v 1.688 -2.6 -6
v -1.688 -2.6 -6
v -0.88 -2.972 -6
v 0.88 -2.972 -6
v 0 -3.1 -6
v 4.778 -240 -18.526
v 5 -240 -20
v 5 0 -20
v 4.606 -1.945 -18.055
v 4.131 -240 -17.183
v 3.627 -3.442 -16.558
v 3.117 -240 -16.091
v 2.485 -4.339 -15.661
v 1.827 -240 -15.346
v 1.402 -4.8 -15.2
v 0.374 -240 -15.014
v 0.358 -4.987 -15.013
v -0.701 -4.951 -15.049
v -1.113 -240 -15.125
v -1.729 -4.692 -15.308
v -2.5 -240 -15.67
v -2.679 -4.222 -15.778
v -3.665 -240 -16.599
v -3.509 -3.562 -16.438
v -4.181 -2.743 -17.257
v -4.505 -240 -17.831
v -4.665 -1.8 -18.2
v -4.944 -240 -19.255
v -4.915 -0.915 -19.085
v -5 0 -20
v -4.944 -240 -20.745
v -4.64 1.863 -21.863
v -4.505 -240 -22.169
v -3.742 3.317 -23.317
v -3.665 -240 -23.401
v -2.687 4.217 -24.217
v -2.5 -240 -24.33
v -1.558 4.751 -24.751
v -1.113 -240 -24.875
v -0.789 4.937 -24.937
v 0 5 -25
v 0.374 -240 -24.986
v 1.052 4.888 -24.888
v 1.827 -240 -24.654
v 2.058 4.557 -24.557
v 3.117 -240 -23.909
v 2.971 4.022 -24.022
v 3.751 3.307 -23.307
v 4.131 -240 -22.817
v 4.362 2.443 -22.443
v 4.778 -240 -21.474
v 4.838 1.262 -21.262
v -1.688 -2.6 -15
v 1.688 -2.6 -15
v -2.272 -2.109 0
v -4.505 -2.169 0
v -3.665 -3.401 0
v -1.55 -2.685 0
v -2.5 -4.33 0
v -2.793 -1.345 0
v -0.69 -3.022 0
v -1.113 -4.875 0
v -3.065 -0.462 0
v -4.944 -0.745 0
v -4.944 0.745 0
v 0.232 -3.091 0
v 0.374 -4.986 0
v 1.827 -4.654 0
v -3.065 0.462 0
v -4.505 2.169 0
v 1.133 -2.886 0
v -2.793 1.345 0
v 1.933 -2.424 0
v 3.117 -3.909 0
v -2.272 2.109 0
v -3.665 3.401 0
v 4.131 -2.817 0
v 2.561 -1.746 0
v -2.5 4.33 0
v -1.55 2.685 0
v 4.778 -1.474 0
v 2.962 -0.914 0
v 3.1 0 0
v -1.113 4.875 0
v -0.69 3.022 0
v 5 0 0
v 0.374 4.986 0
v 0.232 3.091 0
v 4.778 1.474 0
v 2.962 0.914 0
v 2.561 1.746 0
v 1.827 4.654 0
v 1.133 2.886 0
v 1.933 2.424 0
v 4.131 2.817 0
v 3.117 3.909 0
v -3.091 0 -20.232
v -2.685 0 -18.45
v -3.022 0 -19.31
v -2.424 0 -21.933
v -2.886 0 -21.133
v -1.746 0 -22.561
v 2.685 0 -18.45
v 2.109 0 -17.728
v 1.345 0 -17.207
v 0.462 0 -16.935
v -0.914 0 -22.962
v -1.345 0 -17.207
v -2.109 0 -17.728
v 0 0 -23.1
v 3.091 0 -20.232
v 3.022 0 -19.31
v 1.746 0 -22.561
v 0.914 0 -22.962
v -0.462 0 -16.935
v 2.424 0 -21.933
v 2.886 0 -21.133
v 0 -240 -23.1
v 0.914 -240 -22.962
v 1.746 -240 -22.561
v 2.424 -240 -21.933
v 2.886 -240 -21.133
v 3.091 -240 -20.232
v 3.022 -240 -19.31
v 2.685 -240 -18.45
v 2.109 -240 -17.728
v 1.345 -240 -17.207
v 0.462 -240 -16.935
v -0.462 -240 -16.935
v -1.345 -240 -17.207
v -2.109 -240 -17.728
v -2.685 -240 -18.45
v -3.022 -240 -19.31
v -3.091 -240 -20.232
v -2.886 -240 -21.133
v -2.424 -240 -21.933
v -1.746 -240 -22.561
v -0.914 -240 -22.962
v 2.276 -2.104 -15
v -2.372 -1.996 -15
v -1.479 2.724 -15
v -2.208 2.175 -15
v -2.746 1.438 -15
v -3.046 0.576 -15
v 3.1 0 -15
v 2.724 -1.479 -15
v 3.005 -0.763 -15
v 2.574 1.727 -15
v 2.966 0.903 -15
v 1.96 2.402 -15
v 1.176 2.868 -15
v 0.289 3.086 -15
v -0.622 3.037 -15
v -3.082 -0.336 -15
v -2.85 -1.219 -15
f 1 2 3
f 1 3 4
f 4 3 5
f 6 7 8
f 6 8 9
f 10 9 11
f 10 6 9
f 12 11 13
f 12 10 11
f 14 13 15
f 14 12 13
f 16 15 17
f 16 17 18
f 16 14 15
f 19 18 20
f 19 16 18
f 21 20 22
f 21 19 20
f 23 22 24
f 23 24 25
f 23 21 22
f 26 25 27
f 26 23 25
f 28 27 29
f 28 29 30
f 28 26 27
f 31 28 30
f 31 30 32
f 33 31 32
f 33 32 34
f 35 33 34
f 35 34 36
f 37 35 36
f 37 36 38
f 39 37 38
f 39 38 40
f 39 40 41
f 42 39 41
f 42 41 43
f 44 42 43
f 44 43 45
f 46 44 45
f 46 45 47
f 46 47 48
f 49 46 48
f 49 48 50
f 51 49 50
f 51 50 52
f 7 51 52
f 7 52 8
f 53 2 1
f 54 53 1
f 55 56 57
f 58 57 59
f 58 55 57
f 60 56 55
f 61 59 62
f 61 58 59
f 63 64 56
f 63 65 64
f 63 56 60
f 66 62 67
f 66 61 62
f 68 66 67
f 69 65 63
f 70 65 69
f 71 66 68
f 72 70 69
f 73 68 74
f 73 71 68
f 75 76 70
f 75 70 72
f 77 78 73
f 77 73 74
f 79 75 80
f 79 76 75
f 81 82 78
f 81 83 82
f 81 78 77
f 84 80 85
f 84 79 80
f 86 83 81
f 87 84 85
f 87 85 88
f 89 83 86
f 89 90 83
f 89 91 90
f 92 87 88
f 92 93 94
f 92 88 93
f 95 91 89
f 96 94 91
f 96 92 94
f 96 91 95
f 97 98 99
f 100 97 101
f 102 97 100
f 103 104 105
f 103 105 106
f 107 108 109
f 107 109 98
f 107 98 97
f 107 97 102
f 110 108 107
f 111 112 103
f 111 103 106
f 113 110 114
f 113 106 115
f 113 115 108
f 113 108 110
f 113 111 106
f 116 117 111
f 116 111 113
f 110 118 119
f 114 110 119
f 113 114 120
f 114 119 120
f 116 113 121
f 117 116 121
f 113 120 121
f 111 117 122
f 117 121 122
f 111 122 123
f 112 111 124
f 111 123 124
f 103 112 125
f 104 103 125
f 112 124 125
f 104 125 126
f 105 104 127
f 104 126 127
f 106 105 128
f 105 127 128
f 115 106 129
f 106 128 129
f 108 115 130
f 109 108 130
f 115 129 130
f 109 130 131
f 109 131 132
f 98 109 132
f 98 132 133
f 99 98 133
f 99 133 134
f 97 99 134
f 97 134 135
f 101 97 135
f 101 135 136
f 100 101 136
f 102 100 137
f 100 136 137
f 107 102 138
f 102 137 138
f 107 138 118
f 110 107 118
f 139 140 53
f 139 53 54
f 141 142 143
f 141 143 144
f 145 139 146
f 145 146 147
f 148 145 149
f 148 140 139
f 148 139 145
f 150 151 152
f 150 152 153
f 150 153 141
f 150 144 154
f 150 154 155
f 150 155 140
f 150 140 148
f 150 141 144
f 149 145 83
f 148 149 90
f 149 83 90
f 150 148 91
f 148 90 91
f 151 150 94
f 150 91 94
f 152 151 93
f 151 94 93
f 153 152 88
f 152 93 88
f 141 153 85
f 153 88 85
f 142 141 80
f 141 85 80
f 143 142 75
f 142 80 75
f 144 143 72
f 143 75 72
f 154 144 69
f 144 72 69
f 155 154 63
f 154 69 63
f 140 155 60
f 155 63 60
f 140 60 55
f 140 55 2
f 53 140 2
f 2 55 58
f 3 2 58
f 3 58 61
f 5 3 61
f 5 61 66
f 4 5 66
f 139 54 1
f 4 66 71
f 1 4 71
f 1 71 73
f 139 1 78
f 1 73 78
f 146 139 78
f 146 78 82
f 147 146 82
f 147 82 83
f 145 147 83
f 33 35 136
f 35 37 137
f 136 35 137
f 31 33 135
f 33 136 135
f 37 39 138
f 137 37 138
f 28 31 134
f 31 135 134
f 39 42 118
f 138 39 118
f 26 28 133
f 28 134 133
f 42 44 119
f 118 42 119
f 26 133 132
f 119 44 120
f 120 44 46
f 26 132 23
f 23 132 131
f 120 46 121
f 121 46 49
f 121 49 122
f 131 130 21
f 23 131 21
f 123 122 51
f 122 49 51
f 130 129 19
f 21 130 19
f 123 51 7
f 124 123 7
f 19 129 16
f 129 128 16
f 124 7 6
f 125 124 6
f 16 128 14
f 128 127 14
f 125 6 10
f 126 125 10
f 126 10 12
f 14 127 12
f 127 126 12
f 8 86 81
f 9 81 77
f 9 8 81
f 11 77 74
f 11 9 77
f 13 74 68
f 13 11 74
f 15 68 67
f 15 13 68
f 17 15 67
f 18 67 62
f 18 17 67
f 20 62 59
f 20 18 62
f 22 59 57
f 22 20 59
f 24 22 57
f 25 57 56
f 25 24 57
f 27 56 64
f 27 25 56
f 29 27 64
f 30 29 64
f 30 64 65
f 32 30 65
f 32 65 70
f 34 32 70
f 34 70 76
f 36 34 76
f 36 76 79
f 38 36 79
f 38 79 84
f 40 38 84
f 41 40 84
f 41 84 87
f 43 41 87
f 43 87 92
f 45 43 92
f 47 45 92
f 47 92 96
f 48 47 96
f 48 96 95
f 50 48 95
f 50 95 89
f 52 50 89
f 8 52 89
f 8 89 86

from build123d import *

# Parameters (mm, degrees)
SKETCH1_R           = 5
SKETCH2_R           = 3.1
CUT_EXTRUDE1_DEPTH  = 15
SKETCH4_W           = 3.376388604
SKETCH4_H           = 1
BOSS_EXTRUDE1_DEPTH = 9
SKETCH5_R           = 3.1
CUT_EXTRUDE2_DEPTH  = 240


with BuildPart() as part:
    # Sweep1: sweep along a curve in space
    with BuildLine() as sweep1_path:
        Line((0, 0, 0), (0, 0, -20))
        Line((0, 0, -20), (0, -240, -20))
    # Sketch1 → Sweep1 (sweep)
    with BuildSketch(Plane.XY):
        Circle(SKETCH1_R)
    sweep(path=sweep1_path.line, transition=Transition.RIGHT)

    # Sketch2 → Cut-Extrude1 (cut)
    with BuildSketch(Plane.XY):
        Circle(SKETCH2_R)
    extrude(amount=-CUT_EXTRUDE1_DEPTH, mode=Mode.SUBTRACT)

    # Sketch4 → Boss-Extrude1 (add)
    with BuildSketch(Plane.XY.offset(-15)):
        with Locations((0, -3.1)):
            Rectangle(SKETCH4_W, SKETCH4_H)
    extrude(amount=BOSS_EXTRUDE1_DEPTH)

    # Sketch5 → Cut-Extrude2 (cut)
    with BuildSketch(Plane.XZ.offset(240)):
        with Locations(Location((0, -20, 0), (0, 0, 270))):
            Circle(SKETCH5_R)
    extrude(amount=-CUT_EXTRUDE2_DEPTH, mode=Mode.SUBTRACT)


solid = part.part
